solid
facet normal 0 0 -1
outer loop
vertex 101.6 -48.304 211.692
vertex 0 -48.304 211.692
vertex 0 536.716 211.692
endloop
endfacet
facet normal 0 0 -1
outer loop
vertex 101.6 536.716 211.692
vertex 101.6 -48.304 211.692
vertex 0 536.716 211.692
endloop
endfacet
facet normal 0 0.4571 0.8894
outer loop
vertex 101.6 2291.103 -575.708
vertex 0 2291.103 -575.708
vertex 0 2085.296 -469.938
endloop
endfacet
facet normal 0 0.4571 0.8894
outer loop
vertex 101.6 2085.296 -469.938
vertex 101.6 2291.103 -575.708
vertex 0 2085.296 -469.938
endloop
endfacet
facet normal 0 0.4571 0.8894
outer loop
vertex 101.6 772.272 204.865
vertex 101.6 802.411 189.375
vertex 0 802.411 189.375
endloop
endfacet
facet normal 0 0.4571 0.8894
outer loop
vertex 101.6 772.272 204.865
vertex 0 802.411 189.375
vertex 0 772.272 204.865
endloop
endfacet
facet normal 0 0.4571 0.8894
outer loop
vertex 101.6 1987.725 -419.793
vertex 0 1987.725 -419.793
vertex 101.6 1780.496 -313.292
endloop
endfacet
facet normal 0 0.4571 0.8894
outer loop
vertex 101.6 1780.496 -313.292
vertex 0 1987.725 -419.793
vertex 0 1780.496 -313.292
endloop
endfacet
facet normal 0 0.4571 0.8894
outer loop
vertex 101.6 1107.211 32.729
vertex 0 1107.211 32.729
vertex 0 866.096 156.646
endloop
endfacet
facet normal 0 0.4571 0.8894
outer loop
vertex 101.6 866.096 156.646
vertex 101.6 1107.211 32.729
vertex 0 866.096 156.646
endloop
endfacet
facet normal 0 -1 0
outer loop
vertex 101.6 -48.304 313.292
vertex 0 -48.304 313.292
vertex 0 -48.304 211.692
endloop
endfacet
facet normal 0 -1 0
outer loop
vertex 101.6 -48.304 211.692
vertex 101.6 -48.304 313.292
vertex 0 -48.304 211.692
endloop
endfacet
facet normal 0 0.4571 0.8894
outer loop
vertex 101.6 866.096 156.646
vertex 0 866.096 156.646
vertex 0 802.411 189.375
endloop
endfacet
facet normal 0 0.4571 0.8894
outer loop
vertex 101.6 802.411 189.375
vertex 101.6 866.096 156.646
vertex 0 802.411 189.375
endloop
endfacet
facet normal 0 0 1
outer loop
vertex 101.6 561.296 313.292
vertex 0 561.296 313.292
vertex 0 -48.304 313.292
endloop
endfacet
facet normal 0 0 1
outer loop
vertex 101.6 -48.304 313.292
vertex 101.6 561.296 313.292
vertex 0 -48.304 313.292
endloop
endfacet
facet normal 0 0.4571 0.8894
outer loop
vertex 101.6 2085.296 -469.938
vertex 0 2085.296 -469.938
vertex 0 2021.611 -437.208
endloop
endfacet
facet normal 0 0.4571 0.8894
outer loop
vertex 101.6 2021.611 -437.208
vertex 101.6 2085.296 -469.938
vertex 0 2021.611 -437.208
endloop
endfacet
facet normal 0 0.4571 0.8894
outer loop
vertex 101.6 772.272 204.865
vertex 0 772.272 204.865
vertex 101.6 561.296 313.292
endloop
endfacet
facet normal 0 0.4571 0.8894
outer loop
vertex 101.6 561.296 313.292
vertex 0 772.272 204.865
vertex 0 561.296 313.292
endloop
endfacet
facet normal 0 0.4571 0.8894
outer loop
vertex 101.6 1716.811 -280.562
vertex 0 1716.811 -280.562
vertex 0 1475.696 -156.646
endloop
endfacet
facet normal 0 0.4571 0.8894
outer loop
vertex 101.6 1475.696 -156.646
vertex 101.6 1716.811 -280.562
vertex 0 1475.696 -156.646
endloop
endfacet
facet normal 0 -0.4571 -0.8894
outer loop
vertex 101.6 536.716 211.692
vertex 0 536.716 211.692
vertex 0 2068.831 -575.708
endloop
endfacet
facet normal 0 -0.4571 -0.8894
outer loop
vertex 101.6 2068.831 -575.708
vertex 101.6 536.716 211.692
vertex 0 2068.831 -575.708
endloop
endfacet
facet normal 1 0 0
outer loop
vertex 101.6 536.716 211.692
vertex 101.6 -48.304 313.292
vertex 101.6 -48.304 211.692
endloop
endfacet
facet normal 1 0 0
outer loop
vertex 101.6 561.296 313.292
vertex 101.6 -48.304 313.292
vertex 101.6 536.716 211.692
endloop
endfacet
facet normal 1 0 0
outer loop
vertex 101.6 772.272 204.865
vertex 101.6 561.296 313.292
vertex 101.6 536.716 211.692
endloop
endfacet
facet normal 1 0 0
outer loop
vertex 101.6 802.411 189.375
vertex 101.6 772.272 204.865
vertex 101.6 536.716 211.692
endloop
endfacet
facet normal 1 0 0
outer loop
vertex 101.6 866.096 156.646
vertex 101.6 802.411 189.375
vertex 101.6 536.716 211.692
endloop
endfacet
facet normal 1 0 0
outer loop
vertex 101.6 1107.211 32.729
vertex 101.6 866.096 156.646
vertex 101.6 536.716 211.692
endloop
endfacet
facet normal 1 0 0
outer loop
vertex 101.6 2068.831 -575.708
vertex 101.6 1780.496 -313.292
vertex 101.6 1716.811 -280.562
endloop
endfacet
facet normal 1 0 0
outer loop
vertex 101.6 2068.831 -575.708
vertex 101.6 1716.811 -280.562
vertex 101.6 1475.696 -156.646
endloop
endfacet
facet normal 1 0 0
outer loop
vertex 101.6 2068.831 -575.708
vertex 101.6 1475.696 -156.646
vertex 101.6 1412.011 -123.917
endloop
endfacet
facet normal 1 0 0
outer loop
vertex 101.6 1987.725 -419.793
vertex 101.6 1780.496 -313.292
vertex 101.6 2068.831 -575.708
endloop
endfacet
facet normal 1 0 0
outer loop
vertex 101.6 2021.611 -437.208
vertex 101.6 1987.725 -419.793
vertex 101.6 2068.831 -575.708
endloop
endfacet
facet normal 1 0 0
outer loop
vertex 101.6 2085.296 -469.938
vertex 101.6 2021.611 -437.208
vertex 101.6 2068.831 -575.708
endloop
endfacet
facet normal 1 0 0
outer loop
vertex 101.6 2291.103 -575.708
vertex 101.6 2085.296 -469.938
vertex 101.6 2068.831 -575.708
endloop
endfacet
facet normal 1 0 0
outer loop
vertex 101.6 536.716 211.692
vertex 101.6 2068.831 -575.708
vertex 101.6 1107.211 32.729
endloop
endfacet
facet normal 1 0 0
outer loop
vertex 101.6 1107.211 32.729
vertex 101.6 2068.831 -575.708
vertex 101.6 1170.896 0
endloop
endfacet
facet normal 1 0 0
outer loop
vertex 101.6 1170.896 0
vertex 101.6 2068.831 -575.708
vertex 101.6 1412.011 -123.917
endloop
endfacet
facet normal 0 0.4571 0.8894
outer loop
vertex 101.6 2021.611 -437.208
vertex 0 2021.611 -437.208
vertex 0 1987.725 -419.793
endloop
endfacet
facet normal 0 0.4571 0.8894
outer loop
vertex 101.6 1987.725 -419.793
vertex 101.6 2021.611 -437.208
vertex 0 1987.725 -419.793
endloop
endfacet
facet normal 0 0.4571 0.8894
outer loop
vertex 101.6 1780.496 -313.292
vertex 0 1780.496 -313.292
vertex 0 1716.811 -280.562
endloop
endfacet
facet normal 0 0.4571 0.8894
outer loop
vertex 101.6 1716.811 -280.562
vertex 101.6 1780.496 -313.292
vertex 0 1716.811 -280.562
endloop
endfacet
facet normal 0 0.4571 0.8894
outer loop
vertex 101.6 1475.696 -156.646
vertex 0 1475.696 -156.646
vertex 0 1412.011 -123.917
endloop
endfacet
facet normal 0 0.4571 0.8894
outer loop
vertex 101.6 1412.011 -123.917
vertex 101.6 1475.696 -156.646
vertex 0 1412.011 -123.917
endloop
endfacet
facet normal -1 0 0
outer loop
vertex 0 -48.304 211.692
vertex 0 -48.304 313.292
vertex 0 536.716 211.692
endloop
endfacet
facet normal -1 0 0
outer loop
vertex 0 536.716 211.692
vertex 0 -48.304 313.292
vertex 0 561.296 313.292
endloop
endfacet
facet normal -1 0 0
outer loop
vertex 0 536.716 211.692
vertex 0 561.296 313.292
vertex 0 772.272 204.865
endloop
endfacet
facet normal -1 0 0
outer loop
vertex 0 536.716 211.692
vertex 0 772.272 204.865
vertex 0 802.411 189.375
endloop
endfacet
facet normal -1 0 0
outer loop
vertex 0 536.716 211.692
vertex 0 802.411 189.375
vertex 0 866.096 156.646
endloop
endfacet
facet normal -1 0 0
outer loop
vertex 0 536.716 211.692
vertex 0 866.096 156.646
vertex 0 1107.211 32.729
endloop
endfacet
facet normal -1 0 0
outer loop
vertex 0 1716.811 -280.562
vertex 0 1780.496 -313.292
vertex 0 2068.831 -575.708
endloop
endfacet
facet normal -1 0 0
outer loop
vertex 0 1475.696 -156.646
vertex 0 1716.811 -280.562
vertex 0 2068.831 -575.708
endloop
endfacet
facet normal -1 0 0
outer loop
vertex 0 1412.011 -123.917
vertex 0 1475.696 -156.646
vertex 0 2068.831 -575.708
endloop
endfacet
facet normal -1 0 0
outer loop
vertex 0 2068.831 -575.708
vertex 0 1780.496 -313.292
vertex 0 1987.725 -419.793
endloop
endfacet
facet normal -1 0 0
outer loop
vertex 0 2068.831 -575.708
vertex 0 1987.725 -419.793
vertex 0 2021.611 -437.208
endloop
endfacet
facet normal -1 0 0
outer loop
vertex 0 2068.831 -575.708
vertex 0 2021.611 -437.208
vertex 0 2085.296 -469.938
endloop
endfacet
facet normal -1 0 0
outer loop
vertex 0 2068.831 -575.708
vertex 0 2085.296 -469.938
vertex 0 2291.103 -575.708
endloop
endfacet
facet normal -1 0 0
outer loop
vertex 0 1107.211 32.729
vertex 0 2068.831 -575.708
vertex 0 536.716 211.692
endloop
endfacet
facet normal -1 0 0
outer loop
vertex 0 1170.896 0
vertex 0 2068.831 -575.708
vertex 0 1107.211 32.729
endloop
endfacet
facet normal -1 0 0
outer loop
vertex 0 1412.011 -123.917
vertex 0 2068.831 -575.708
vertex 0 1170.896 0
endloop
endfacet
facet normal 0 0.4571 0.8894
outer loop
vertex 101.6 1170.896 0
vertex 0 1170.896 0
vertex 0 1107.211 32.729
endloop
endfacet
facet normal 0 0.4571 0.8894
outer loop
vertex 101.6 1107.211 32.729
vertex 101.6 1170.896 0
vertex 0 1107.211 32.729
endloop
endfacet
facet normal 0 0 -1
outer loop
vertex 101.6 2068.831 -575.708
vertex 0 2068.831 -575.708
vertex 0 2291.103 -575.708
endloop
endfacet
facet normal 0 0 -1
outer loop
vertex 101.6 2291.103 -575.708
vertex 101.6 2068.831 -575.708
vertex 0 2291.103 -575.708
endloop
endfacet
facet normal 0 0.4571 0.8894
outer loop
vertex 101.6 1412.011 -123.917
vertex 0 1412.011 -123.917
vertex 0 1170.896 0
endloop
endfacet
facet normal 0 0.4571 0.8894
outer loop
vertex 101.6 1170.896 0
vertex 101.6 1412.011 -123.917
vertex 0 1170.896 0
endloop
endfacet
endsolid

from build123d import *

# Parameters (mm, degrees)
F1_DEPTH = 101.6


with BuildPart() as f1:
    # F0 (on Right) → F1 (new body)
    with BuildSketch(Plane.YZ):
        Polygon((561.29576, 313.291845), (-48.30424, 313.291845), (-48.30424, 211.691845), (536.716133, 211.691845), (2068.830831, -575.708155), (2291.102677, -575.708155), (2085.29576, -469.937767), (2021.611301, -437.208401), (1987.724537, -419.79297), (1780.49576, -313.291845), (1716.811301, -280.562478), (1475.69576, -156.645922), (1412.011301, -123.916556), (1170.89576, 0), (1107.211301, 32.729366), (866.09576, 156.645922), (802.411301, 189.375289), (772.271858, 204.864858), align=None)
    extrude(amount=F1_DEPTH)


solid = f1.part
